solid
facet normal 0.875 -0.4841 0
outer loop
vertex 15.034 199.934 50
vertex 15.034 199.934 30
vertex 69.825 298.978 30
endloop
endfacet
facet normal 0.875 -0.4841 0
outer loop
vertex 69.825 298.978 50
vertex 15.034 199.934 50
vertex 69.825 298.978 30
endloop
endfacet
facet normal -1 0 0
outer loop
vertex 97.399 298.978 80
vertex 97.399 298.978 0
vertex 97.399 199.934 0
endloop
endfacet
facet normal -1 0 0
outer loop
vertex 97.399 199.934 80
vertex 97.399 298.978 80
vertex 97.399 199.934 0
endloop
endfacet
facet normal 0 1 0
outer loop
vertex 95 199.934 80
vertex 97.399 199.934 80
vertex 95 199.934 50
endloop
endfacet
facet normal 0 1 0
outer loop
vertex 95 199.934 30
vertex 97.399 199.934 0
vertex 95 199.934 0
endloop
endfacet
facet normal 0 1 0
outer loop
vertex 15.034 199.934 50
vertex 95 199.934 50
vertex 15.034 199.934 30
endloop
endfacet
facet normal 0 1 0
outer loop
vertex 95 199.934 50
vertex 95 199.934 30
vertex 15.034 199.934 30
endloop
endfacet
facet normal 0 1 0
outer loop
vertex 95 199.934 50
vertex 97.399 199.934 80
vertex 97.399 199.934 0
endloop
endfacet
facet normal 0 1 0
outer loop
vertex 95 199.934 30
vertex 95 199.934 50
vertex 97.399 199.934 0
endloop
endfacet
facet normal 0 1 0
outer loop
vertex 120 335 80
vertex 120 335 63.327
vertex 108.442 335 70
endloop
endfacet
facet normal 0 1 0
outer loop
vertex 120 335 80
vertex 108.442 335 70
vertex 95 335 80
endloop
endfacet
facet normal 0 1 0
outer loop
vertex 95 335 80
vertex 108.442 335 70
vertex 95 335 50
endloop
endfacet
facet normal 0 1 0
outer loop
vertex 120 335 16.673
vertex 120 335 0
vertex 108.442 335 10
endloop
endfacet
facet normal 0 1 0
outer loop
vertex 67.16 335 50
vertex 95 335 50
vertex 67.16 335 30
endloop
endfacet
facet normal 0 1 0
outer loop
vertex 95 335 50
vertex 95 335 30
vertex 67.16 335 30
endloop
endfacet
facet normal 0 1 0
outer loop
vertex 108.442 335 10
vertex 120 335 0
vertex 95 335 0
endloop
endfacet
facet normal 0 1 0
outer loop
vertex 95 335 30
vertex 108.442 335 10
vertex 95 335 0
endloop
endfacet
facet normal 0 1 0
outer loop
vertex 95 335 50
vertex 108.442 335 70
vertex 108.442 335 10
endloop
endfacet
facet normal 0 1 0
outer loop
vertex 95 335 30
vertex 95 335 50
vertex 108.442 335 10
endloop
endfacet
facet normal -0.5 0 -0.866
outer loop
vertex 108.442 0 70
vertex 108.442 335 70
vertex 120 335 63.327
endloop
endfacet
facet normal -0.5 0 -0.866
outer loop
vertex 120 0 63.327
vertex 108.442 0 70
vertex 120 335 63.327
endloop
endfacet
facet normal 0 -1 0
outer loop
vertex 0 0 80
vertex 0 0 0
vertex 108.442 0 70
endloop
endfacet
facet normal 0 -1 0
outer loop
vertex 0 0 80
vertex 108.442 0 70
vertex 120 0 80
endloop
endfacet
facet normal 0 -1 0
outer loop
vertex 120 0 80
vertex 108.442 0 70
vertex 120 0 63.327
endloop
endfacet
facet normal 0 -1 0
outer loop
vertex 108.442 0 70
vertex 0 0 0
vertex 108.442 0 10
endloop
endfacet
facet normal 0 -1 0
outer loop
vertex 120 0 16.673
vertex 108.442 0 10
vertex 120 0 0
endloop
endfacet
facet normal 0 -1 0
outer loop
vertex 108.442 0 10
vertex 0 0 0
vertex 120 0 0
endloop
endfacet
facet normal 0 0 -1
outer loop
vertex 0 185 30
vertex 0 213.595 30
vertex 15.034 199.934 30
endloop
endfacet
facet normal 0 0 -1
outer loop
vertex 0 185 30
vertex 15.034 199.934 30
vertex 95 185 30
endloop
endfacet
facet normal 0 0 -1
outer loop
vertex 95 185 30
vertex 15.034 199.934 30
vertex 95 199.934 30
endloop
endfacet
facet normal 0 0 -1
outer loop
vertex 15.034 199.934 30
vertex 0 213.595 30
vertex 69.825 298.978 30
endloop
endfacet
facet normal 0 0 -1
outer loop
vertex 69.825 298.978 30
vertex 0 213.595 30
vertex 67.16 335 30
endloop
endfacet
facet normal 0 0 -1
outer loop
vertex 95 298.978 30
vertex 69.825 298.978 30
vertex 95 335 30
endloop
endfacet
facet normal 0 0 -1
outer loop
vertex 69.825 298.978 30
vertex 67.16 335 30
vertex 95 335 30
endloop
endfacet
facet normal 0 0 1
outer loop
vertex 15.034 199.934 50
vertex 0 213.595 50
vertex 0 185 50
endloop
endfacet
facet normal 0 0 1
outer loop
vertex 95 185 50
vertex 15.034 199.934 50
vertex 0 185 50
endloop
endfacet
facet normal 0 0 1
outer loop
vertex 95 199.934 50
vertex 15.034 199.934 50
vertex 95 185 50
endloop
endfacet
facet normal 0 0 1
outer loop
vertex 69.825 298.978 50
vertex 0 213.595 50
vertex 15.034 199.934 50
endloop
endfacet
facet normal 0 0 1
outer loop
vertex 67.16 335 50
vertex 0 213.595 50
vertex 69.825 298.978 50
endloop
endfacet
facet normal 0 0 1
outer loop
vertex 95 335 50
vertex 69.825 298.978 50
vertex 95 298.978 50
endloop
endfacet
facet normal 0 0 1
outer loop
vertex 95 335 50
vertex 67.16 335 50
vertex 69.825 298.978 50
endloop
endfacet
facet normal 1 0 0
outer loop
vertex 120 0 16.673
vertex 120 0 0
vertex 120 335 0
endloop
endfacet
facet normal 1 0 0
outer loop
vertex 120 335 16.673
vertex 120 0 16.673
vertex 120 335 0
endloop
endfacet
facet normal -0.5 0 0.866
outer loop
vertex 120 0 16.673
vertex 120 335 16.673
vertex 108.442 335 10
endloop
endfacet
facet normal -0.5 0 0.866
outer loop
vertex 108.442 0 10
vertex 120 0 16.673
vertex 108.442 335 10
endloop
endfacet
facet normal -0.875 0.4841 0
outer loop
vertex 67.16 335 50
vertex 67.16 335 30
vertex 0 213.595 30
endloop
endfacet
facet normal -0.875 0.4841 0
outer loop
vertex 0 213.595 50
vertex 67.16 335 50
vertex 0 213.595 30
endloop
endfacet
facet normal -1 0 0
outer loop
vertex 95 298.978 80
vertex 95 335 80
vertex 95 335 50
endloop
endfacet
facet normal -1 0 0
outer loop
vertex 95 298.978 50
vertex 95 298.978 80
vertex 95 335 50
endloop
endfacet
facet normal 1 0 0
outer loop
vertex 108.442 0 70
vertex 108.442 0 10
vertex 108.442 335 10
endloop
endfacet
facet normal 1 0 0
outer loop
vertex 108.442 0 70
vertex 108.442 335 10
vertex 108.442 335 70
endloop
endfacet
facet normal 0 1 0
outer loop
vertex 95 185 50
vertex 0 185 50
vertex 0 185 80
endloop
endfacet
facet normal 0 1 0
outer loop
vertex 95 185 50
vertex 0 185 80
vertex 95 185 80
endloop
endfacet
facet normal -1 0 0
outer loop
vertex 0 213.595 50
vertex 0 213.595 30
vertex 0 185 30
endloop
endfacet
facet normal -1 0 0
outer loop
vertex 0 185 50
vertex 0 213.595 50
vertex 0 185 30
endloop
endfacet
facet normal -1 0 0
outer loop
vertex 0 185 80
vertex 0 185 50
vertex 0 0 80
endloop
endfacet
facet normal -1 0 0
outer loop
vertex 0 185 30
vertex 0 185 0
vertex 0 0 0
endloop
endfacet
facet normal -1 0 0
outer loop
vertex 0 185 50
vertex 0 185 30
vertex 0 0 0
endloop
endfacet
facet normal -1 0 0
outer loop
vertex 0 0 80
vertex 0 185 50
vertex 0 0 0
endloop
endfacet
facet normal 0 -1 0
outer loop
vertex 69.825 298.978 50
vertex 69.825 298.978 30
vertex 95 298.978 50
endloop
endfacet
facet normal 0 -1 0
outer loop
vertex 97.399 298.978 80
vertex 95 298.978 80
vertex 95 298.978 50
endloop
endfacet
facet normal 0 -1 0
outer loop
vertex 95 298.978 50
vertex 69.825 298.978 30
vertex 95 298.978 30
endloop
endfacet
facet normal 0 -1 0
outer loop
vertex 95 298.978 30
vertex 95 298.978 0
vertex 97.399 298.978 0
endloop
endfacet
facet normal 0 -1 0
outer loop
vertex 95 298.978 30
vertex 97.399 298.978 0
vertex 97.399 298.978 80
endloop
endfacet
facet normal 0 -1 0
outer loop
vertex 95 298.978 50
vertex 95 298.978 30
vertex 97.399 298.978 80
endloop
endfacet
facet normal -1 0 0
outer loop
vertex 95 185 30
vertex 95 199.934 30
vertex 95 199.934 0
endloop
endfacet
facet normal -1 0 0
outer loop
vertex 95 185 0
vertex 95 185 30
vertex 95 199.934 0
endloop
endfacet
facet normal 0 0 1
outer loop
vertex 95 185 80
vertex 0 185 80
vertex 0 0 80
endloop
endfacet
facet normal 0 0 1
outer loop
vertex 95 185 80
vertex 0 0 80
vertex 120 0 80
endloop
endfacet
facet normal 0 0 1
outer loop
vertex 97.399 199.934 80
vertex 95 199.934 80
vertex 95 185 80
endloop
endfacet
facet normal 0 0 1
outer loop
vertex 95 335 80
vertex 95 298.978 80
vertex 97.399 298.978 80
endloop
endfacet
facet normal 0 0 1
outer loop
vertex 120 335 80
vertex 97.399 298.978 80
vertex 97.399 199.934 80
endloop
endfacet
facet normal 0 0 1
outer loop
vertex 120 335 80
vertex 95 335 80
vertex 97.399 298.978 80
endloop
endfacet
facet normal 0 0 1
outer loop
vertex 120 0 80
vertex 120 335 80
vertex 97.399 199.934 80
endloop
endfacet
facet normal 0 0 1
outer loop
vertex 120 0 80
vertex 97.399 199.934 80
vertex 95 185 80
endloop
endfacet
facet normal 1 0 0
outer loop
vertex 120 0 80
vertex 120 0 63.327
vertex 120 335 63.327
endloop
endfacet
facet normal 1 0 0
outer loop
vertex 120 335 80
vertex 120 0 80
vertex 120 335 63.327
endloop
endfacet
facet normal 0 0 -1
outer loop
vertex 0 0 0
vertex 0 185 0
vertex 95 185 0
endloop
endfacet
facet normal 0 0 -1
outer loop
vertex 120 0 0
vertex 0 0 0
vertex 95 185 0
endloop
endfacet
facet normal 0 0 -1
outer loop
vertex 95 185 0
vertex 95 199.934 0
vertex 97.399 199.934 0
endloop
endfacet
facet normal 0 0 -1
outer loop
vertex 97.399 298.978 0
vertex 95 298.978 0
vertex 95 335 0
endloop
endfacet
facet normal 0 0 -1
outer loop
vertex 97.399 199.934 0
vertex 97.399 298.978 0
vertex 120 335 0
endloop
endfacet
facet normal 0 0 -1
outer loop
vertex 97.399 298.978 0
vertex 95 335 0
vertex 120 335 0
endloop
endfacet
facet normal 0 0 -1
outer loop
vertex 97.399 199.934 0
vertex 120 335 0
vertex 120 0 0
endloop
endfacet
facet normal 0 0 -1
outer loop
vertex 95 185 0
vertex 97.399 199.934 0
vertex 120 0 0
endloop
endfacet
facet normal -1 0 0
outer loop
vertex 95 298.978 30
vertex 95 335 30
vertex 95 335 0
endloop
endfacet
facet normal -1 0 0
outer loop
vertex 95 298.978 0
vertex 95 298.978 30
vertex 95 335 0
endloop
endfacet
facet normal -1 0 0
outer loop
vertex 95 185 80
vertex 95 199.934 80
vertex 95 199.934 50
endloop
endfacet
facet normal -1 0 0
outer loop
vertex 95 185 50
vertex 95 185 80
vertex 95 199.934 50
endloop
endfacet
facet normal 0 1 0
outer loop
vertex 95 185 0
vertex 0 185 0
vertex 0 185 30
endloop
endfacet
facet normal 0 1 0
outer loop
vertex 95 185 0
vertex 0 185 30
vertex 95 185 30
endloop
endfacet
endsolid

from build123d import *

# Parameters (mm, degrees)
EXTRUDE_1_DEPTH     = 80
SKETCH_2_W          = 95
SKETCH_2_H          = 30
CUT_EXTRUDE_1_DEPTH = 150
CUT_EXTRUDE_2_DEPTH = 336


with BuildPart() as part:
    # Эскиз1 → Бобышка-Вытянуть1 (new body)
    with BuildSketch(Plane.XY):
        Polygon((0, 0), (120, 0), (120, 335), (67.160475454, 335), (0, 213.59536065), align=None)
        Polygon((15.034284713, 199.934070047), (69.825157074, 298.978426921), (97.39949173, 298.978426921), (97.39949173, 199.934070047), align=None, mode=Mode.SUBTRACT)
    extrude(amount=EXTRUDE_1_DEPTH)

    # Эскиз2 → Вырез-Вытянуть1 (cut)
    with BuildSketch(Plane(origin=(0, 335, 0), x_dir=(1, 0, 0), z_dir=(0, 1, 0))):
        with Locations((47.5, -15)):
            Rectangle(SKETCH_2_W, SKETCH_2_H)
        with Locations((47.5, -65)):
            Rectangle(SKETCH_2_W, SKETCH_2_H)
    extrude(amount=-CUT_EXTRUDE_1_DEPTH, mode=Mode.SUBTRACT)

    # Эскиз3 → Вырез-Вытянуть2 (cut, through all)
    with BuildSketch(Plane(origin=(0, 335, 0), x_dir=(1, 0, 0), z_dir=(0, 1, 0))):
        Polygon((108.441945131, -10), (108.441945131, -70), (120, -63.32695391), (120, -16.67304609), align=None)
    extrude(amount=-CUT_EXTRUDE_2_DEPTH, mode=Mode.SUBTRACT)


solid = part.part
